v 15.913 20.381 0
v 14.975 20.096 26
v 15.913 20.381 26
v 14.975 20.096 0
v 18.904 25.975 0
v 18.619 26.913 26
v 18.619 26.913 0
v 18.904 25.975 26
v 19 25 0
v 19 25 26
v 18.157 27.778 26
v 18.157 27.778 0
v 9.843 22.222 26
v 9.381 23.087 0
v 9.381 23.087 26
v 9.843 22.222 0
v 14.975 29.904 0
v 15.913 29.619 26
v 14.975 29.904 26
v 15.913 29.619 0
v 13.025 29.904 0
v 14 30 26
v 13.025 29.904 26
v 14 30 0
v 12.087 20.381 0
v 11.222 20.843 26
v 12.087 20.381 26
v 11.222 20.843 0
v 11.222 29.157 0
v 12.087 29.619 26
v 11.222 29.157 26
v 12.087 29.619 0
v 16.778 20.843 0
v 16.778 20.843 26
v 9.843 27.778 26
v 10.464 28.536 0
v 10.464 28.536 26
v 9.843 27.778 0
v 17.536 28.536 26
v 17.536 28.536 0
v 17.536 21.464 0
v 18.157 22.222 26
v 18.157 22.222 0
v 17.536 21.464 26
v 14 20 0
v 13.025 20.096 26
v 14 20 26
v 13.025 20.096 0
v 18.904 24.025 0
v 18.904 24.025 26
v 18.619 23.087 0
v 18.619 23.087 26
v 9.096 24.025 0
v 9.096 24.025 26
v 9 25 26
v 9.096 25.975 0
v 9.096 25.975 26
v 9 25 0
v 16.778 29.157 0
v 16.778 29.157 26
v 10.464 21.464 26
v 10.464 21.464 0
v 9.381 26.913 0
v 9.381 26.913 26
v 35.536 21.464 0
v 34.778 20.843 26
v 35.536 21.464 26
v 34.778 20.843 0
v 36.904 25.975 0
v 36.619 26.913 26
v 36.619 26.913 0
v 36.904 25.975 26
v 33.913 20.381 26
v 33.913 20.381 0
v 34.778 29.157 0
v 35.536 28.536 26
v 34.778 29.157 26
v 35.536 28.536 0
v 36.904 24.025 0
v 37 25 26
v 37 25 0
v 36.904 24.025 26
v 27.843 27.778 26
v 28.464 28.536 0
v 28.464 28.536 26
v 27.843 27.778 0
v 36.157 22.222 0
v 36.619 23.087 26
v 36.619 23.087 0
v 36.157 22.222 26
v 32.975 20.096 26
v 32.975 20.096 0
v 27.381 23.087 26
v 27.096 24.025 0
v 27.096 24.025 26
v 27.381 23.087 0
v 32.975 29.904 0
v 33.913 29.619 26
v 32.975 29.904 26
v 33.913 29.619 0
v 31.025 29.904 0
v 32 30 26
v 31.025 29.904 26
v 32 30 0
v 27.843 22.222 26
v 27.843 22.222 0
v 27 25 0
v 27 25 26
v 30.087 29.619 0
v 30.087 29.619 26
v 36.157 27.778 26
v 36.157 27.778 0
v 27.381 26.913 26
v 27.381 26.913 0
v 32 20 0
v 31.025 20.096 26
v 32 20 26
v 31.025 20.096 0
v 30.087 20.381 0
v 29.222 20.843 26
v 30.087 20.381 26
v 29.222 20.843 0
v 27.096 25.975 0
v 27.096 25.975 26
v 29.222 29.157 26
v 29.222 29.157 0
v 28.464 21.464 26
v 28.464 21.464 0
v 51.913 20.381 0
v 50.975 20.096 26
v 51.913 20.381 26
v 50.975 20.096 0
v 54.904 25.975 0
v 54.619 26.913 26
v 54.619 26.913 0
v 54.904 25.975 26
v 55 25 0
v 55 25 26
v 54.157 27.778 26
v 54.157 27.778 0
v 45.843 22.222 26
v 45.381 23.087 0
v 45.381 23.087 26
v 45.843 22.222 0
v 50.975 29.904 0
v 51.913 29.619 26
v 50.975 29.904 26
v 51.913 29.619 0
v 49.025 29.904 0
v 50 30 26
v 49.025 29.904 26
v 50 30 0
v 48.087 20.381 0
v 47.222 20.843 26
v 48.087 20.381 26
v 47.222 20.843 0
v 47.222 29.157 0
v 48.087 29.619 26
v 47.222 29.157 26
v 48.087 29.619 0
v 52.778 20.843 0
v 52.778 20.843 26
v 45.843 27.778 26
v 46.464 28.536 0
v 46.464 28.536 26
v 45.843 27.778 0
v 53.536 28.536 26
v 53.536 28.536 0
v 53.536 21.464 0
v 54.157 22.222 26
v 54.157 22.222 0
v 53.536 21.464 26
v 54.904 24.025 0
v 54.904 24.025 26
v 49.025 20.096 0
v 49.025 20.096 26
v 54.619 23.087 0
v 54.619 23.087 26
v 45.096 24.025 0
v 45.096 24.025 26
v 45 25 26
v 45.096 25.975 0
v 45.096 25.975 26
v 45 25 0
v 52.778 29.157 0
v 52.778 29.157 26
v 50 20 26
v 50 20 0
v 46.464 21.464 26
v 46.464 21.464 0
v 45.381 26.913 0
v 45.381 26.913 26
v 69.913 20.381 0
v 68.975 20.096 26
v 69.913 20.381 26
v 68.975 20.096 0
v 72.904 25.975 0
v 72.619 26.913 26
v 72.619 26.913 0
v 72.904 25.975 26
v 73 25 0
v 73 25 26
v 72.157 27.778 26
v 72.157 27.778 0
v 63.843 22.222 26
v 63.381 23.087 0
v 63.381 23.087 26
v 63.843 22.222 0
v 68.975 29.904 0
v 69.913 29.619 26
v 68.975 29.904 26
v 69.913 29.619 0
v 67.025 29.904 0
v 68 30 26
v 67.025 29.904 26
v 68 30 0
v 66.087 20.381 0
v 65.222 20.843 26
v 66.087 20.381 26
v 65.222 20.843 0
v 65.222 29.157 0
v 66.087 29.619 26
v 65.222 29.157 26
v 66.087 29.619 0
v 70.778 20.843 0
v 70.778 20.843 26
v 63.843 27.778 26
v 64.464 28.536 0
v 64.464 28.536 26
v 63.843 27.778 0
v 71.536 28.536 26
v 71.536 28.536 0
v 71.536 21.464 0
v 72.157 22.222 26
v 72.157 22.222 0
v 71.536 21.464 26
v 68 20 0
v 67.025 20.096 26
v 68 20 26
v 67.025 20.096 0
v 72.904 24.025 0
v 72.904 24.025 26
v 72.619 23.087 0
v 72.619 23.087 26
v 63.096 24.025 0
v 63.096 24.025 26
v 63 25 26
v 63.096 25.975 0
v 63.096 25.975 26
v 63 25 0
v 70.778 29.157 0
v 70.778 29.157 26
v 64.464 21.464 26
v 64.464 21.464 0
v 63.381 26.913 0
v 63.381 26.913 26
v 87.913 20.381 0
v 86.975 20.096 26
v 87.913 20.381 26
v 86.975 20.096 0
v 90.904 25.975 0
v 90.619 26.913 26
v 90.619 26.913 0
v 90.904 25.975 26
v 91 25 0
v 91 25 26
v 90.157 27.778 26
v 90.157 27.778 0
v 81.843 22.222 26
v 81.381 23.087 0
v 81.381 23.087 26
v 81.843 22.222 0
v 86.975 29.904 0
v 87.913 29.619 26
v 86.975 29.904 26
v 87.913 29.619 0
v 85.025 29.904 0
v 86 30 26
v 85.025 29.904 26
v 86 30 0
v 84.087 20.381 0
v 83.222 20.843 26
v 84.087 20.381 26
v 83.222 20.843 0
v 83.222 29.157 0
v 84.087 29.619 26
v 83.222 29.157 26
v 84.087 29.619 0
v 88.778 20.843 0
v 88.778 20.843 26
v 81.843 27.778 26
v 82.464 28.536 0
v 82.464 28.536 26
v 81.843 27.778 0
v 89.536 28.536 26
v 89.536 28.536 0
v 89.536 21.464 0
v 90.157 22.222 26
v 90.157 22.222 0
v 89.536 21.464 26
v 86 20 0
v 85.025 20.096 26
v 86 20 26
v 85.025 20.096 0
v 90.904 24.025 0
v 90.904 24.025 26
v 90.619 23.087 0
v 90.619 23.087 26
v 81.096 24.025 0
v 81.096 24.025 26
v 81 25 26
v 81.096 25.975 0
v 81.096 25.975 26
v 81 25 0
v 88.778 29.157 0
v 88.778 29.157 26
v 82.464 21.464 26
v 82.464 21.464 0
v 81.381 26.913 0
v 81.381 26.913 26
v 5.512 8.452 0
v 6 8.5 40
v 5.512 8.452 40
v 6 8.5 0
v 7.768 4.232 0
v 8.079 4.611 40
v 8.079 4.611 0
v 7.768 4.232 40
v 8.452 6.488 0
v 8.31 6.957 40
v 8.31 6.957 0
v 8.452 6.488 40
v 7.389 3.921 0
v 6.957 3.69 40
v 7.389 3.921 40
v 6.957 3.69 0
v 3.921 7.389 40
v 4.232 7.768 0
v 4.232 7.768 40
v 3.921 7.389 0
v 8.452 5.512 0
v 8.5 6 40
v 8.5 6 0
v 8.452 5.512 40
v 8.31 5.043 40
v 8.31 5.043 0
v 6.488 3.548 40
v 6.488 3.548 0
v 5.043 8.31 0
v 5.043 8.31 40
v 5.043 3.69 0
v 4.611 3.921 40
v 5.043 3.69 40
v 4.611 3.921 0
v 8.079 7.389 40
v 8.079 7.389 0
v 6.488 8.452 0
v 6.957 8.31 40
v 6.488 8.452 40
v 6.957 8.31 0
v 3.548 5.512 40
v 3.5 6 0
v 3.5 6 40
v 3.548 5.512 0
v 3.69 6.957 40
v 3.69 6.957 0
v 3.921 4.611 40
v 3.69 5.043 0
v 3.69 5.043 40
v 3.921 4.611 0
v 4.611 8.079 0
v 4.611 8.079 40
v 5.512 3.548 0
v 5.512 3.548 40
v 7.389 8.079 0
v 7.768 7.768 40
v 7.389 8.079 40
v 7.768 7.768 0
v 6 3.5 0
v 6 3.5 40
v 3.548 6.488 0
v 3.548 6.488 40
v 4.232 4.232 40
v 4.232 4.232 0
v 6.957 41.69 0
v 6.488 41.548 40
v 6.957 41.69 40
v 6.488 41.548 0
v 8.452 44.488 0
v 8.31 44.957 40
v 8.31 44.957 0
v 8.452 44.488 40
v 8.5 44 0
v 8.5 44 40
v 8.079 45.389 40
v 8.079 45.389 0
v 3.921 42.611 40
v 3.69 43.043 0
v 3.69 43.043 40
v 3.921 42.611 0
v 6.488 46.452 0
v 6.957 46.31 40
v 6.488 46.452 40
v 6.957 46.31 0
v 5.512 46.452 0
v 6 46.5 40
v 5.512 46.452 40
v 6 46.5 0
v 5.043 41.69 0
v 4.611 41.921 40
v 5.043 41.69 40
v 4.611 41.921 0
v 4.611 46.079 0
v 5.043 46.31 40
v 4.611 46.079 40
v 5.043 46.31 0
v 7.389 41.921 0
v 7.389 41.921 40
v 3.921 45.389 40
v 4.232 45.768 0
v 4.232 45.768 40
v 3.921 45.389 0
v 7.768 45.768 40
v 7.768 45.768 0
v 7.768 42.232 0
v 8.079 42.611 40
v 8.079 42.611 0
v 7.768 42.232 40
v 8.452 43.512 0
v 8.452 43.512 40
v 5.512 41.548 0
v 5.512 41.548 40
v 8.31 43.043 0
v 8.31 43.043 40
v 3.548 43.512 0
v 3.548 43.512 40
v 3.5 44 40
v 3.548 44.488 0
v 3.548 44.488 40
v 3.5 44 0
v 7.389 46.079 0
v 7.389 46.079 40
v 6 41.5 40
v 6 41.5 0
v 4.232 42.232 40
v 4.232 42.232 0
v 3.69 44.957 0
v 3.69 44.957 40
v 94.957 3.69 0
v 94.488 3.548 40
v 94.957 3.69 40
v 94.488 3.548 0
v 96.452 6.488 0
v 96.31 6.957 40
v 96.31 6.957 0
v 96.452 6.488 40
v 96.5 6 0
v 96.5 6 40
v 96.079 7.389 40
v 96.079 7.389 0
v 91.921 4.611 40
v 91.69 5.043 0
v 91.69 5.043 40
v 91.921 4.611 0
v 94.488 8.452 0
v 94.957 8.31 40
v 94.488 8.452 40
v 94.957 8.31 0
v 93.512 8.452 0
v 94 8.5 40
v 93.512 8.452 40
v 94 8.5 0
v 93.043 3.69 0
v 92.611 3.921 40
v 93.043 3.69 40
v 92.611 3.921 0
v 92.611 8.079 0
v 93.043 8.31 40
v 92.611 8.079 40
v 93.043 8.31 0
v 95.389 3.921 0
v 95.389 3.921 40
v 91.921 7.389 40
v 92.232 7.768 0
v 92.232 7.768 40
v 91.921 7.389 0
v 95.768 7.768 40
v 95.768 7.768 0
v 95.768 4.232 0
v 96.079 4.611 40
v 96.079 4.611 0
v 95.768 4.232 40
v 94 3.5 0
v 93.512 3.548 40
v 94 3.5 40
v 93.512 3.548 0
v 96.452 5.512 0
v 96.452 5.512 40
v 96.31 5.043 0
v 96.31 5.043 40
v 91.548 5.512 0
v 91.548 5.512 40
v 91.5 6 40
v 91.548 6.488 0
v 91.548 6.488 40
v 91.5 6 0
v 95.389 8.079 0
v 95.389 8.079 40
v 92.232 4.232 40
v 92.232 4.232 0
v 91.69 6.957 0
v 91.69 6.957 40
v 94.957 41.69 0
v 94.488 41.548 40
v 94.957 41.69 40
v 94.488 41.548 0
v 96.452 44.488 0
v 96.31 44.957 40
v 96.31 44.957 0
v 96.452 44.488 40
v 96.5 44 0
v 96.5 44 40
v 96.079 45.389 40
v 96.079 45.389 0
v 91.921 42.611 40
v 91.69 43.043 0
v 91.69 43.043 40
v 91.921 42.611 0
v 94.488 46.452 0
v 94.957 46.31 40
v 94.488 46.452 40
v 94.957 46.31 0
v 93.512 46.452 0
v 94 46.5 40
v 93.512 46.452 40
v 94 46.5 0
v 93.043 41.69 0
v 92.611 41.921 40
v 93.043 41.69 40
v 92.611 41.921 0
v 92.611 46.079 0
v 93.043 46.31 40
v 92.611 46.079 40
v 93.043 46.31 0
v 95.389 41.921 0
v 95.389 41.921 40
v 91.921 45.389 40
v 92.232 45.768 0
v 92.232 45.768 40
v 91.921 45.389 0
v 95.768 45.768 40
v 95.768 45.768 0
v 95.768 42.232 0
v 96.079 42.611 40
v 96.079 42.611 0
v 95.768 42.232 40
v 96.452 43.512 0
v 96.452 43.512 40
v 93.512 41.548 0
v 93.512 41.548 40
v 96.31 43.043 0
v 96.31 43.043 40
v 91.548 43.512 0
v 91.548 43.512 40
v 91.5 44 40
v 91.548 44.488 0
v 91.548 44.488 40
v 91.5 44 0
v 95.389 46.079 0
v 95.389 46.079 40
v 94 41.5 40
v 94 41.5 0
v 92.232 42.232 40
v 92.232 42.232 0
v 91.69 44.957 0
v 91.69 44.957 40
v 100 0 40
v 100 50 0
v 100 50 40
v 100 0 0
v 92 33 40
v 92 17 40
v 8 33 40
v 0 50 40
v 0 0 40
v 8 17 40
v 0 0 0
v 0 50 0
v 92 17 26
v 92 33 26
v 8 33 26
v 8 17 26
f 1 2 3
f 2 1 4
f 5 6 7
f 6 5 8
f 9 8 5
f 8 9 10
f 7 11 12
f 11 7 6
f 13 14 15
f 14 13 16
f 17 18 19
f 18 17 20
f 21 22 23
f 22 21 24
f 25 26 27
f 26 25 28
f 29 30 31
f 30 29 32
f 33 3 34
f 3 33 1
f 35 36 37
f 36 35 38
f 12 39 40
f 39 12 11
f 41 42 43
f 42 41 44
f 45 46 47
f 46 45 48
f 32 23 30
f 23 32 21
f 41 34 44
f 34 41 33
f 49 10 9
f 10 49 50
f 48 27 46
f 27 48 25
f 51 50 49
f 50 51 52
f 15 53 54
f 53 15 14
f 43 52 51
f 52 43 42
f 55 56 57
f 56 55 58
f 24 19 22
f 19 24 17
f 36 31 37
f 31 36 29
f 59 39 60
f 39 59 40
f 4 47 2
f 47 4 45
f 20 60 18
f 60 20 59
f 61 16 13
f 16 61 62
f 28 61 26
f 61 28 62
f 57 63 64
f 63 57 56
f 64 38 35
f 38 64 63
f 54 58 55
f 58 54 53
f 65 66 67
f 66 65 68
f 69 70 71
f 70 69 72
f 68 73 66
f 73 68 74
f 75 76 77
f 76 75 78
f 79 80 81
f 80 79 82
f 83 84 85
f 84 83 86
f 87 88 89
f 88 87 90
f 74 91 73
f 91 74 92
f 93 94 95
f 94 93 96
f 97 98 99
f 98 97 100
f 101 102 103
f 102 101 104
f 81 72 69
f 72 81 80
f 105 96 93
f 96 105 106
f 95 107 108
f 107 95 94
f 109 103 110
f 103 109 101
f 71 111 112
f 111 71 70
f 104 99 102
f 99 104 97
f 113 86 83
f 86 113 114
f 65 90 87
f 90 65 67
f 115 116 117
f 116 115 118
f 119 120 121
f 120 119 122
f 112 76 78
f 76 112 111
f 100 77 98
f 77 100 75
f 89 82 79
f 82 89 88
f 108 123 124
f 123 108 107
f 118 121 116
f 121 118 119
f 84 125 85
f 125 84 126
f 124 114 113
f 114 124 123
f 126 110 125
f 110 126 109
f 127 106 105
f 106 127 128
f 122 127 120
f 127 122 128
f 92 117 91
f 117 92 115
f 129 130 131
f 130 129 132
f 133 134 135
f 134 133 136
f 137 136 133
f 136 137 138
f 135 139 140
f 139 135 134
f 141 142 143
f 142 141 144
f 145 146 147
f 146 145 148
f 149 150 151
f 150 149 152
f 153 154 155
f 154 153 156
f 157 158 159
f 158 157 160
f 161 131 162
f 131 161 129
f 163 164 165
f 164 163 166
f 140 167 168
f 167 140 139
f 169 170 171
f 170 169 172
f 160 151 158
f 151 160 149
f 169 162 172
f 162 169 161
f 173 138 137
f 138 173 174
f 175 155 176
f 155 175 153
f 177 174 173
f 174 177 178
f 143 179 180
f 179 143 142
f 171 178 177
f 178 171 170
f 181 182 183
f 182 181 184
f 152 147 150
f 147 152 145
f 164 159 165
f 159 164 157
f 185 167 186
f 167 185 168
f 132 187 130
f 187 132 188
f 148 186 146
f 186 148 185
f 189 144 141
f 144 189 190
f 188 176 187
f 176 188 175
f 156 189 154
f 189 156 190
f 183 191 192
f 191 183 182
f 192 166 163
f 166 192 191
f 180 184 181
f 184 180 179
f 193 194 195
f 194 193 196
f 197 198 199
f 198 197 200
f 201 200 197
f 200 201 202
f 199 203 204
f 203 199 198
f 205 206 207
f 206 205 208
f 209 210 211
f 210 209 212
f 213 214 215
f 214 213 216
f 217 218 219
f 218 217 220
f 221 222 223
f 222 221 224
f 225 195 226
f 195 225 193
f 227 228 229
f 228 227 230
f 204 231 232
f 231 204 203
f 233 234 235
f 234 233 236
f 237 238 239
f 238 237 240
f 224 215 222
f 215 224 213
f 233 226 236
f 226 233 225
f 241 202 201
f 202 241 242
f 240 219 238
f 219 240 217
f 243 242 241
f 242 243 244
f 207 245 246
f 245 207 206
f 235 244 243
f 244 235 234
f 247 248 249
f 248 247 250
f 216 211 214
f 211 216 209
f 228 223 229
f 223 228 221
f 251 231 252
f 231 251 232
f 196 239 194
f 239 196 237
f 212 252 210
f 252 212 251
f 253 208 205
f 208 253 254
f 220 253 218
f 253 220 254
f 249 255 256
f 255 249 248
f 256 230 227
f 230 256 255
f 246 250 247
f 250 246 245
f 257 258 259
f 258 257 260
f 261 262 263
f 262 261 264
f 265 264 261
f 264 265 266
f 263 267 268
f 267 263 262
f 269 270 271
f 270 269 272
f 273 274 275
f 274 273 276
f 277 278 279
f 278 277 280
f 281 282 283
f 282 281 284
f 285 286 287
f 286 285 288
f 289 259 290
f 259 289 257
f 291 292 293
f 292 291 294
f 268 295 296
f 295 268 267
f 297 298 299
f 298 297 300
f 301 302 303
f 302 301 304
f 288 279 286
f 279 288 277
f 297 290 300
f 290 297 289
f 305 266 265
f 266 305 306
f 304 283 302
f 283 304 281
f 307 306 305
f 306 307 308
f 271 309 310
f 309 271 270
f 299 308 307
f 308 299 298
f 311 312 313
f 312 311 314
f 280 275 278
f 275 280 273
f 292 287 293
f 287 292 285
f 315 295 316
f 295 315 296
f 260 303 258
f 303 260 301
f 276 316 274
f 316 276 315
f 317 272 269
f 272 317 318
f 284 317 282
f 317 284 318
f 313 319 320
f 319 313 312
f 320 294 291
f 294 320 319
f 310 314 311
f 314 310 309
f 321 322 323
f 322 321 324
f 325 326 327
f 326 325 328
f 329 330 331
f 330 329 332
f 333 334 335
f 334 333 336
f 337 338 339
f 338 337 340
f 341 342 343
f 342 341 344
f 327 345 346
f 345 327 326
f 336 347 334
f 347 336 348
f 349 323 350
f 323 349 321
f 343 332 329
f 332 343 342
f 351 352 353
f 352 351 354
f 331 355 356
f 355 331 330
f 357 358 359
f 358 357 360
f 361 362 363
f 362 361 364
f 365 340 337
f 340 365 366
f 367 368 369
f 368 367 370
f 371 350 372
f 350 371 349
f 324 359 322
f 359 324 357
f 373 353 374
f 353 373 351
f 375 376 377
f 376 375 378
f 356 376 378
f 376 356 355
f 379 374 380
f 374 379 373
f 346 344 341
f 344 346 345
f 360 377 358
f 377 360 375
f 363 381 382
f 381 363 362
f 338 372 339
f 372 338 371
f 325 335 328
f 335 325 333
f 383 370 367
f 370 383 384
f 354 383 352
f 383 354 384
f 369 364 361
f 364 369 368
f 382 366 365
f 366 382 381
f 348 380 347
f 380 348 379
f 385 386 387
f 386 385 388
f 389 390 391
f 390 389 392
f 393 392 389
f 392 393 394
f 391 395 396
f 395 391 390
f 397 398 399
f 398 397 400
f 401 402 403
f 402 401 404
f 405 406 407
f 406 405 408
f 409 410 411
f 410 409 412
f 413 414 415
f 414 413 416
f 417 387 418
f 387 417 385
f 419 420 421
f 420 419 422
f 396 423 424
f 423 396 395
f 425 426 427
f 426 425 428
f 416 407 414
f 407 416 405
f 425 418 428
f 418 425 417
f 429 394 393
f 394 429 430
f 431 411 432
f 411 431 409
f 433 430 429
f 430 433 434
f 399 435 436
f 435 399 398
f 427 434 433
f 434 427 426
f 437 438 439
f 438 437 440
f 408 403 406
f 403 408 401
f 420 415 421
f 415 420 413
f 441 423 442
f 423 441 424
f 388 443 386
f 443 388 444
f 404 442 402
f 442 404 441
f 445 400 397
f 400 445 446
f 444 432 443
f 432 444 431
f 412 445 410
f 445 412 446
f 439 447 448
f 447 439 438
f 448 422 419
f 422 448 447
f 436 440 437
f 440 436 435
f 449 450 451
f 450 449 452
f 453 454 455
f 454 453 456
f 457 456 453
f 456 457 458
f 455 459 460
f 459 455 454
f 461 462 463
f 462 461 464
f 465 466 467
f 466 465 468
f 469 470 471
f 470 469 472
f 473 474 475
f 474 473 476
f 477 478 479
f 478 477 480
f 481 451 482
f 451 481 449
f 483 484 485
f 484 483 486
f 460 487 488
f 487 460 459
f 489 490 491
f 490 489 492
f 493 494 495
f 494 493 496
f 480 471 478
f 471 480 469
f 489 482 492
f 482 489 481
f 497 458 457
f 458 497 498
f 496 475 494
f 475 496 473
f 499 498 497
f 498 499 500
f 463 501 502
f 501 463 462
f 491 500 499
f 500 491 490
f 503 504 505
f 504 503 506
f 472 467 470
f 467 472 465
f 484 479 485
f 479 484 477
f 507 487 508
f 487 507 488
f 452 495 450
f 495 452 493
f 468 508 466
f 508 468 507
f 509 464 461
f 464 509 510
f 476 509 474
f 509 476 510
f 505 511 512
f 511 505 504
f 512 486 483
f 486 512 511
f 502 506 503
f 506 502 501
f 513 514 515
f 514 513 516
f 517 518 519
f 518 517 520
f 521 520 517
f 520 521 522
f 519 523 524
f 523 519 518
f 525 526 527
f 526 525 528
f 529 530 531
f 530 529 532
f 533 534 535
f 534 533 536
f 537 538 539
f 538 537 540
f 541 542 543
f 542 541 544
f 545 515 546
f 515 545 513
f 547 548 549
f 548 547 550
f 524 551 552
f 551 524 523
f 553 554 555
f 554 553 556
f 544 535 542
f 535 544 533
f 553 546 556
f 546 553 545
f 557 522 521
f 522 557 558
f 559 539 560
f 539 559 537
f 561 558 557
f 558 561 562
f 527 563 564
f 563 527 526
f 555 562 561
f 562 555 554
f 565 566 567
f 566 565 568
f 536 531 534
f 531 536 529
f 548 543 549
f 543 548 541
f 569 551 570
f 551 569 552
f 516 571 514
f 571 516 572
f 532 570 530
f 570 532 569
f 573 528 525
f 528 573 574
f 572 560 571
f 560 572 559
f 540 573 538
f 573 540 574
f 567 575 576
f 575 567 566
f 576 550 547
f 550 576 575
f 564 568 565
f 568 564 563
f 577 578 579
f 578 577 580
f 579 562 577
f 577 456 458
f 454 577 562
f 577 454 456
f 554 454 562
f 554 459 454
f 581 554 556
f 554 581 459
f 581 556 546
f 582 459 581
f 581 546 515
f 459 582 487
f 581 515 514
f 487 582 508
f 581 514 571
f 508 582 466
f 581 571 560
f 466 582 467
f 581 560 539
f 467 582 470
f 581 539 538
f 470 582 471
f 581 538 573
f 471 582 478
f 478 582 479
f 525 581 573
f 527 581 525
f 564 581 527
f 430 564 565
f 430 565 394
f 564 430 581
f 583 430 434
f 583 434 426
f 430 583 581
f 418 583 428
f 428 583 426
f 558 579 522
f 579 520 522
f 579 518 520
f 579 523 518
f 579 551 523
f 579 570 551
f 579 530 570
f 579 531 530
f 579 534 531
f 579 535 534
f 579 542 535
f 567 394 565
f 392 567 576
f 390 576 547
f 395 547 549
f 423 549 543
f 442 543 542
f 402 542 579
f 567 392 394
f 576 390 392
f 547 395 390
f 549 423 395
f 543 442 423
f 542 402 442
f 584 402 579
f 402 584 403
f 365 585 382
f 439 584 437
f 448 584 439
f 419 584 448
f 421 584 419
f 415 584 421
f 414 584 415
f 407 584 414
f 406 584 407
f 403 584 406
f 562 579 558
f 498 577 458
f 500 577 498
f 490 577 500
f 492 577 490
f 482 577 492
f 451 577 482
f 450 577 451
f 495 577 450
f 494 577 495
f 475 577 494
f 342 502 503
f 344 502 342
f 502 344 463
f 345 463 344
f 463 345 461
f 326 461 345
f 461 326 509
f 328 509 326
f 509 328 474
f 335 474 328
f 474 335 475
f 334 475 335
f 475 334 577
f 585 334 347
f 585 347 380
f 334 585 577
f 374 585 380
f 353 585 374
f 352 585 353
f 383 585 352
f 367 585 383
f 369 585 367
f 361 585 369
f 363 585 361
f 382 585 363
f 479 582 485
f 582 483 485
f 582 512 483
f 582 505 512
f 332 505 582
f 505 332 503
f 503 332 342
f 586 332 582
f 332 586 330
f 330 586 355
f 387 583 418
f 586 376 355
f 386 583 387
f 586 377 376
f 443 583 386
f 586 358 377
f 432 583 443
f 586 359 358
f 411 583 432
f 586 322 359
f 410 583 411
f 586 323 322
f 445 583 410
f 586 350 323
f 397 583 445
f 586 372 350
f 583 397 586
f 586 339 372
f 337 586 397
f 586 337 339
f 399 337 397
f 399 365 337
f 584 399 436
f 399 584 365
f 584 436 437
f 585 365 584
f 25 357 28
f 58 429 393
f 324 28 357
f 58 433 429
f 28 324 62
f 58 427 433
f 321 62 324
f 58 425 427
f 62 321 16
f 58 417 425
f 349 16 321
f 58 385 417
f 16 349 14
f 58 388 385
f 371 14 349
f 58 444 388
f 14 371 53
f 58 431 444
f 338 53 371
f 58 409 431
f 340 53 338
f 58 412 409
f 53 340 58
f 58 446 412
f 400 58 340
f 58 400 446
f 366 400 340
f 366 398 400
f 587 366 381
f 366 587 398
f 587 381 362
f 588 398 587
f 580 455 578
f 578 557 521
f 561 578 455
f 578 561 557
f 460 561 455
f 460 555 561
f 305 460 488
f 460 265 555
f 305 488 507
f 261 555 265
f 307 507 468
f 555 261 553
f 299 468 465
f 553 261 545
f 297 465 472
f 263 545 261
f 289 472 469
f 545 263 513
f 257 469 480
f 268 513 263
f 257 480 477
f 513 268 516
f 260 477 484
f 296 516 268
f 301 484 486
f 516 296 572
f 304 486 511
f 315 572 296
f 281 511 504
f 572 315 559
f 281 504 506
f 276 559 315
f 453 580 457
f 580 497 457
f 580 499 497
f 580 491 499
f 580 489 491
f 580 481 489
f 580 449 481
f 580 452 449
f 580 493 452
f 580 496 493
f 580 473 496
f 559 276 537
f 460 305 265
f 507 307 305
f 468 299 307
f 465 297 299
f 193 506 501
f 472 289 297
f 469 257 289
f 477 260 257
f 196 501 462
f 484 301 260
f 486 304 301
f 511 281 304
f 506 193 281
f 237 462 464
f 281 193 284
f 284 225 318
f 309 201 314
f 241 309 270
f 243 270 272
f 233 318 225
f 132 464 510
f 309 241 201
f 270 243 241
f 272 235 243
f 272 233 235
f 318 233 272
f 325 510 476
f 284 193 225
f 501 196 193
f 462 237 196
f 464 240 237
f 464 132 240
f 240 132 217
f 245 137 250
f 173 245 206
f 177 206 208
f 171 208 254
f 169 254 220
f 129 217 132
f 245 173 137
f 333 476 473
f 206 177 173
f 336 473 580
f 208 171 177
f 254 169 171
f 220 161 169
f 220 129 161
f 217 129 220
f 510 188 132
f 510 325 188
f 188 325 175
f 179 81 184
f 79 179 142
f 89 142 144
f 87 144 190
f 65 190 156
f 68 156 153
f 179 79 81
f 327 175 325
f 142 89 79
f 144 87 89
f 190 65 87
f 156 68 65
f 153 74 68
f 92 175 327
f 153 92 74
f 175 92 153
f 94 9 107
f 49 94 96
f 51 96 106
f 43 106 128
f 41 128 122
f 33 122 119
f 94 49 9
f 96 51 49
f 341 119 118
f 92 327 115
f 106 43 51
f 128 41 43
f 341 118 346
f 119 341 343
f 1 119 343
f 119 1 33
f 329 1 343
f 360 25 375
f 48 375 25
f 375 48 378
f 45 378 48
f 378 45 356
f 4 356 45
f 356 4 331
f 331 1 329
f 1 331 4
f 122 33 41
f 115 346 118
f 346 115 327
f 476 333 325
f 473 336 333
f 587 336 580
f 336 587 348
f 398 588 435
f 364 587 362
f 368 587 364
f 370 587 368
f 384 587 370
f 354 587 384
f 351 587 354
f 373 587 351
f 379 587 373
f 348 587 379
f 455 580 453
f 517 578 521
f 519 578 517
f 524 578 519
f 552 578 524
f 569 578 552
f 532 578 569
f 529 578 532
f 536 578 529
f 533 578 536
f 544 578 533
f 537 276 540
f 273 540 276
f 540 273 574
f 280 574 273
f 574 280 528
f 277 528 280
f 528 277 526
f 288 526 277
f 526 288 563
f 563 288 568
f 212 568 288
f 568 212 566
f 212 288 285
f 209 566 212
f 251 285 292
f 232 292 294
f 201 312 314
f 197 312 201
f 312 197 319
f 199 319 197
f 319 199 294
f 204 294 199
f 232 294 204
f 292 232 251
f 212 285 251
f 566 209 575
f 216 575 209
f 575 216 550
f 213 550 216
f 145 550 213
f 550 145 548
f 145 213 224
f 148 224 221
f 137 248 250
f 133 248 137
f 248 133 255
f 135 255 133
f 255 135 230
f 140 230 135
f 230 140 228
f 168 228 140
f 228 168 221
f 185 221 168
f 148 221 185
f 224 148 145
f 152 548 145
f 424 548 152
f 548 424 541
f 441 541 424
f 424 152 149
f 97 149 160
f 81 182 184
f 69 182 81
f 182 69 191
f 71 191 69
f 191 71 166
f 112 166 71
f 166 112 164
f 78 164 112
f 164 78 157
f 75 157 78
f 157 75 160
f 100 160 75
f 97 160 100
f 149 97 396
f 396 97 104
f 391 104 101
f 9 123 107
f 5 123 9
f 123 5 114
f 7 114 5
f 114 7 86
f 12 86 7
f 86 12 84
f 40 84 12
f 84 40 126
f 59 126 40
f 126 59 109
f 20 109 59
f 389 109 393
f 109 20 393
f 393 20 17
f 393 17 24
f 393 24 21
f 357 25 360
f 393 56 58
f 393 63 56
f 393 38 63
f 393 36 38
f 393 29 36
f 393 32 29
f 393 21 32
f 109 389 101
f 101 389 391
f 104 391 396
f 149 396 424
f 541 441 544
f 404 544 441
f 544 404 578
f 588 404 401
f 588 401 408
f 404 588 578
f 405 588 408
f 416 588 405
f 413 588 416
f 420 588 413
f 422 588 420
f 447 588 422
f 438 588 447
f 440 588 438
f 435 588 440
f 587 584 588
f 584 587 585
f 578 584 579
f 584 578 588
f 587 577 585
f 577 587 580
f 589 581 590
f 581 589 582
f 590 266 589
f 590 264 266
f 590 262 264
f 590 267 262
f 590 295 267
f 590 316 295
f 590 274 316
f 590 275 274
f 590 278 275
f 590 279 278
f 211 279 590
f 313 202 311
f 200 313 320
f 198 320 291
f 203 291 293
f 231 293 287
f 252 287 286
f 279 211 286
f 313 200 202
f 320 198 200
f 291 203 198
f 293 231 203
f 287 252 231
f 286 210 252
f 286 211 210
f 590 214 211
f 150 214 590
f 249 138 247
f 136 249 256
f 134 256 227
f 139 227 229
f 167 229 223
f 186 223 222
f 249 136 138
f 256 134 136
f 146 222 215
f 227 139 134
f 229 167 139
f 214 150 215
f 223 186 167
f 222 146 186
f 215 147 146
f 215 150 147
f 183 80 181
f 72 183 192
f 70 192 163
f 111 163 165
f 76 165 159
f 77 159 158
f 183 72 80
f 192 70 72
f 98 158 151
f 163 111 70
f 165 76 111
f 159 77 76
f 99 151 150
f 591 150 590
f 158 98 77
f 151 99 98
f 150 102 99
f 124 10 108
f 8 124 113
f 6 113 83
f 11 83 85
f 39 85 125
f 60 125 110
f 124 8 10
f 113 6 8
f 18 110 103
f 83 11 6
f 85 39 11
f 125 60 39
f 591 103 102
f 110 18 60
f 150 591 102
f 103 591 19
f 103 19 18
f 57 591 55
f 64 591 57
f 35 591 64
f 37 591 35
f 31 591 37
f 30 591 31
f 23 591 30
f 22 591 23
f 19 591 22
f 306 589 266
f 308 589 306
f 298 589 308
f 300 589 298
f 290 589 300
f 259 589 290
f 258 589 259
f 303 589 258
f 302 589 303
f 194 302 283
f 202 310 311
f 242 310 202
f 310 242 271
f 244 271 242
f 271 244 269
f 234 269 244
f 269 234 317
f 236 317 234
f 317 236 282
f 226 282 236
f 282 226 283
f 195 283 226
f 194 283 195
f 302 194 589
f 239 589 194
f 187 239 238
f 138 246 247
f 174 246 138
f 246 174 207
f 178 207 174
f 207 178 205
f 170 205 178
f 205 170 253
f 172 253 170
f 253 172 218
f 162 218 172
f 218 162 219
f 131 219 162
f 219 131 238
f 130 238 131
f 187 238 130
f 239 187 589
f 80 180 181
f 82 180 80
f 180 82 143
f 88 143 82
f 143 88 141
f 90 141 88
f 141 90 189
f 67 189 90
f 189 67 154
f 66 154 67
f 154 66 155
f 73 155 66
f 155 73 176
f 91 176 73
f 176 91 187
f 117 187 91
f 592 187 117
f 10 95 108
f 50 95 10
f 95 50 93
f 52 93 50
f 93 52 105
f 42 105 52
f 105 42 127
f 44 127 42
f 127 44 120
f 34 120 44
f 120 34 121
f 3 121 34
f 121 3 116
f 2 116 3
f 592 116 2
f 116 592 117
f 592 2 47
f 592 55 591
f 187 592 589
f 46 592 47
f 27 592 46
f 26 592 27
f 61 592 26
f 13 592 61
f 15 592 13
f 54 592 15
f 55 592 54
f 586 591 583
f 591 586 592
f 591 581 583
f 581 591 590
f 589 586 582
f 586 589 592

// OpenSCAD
$fn = 32;

// ----------------------------------------------------------------------
// Manifold block: gallery_top manifold
// ----------------------------------------------------------------------

// --- parameters (mm) ---
block_l = 100;            // block length, X
block_w = 50;             // block width, Y
block_h = 40;             // block height, Z
port_d = 10;              // port bore diameter
port_pitch = 18;          // port pitch along X
gallery_d = 16;           // top gallery width, Y
gallery_depth = 14;       // gallery pocket depth
wall_p = 8;               // gallery end wall thickness, X
mnt_d = 5;                // mounting hole diameter
mnt_in = 6;               // mounting hole inset from the edges

n_ports = 5;  // ports in the row
port_x0 = (block_l - (n_ports - 1) * port_pitch) / 2;  // first port X

difference() {
  cube([block_l, block_w, block_h]);
  for (i = [0 : n_ports - 1])
    translate([port_x0 + i * port_pitch, block_w / 2, -1])
      cylinder(h = block_h + 2, d = port_d);
  translate([wall_p, block_w / 2 - gallery_d / 2, block_h - gallery_depth])
    cube([block_l - 2 * wall_p, gallery_d, gallery_depth + 1]);
  for (cx = [mnt_in, block_l - mnt_in])
    for (cy = [mnt_in, block_w - mnt_in])
      translate([cx, cy, -1]) cylinder(h = block_h + 2, d = mnt_d);
}
